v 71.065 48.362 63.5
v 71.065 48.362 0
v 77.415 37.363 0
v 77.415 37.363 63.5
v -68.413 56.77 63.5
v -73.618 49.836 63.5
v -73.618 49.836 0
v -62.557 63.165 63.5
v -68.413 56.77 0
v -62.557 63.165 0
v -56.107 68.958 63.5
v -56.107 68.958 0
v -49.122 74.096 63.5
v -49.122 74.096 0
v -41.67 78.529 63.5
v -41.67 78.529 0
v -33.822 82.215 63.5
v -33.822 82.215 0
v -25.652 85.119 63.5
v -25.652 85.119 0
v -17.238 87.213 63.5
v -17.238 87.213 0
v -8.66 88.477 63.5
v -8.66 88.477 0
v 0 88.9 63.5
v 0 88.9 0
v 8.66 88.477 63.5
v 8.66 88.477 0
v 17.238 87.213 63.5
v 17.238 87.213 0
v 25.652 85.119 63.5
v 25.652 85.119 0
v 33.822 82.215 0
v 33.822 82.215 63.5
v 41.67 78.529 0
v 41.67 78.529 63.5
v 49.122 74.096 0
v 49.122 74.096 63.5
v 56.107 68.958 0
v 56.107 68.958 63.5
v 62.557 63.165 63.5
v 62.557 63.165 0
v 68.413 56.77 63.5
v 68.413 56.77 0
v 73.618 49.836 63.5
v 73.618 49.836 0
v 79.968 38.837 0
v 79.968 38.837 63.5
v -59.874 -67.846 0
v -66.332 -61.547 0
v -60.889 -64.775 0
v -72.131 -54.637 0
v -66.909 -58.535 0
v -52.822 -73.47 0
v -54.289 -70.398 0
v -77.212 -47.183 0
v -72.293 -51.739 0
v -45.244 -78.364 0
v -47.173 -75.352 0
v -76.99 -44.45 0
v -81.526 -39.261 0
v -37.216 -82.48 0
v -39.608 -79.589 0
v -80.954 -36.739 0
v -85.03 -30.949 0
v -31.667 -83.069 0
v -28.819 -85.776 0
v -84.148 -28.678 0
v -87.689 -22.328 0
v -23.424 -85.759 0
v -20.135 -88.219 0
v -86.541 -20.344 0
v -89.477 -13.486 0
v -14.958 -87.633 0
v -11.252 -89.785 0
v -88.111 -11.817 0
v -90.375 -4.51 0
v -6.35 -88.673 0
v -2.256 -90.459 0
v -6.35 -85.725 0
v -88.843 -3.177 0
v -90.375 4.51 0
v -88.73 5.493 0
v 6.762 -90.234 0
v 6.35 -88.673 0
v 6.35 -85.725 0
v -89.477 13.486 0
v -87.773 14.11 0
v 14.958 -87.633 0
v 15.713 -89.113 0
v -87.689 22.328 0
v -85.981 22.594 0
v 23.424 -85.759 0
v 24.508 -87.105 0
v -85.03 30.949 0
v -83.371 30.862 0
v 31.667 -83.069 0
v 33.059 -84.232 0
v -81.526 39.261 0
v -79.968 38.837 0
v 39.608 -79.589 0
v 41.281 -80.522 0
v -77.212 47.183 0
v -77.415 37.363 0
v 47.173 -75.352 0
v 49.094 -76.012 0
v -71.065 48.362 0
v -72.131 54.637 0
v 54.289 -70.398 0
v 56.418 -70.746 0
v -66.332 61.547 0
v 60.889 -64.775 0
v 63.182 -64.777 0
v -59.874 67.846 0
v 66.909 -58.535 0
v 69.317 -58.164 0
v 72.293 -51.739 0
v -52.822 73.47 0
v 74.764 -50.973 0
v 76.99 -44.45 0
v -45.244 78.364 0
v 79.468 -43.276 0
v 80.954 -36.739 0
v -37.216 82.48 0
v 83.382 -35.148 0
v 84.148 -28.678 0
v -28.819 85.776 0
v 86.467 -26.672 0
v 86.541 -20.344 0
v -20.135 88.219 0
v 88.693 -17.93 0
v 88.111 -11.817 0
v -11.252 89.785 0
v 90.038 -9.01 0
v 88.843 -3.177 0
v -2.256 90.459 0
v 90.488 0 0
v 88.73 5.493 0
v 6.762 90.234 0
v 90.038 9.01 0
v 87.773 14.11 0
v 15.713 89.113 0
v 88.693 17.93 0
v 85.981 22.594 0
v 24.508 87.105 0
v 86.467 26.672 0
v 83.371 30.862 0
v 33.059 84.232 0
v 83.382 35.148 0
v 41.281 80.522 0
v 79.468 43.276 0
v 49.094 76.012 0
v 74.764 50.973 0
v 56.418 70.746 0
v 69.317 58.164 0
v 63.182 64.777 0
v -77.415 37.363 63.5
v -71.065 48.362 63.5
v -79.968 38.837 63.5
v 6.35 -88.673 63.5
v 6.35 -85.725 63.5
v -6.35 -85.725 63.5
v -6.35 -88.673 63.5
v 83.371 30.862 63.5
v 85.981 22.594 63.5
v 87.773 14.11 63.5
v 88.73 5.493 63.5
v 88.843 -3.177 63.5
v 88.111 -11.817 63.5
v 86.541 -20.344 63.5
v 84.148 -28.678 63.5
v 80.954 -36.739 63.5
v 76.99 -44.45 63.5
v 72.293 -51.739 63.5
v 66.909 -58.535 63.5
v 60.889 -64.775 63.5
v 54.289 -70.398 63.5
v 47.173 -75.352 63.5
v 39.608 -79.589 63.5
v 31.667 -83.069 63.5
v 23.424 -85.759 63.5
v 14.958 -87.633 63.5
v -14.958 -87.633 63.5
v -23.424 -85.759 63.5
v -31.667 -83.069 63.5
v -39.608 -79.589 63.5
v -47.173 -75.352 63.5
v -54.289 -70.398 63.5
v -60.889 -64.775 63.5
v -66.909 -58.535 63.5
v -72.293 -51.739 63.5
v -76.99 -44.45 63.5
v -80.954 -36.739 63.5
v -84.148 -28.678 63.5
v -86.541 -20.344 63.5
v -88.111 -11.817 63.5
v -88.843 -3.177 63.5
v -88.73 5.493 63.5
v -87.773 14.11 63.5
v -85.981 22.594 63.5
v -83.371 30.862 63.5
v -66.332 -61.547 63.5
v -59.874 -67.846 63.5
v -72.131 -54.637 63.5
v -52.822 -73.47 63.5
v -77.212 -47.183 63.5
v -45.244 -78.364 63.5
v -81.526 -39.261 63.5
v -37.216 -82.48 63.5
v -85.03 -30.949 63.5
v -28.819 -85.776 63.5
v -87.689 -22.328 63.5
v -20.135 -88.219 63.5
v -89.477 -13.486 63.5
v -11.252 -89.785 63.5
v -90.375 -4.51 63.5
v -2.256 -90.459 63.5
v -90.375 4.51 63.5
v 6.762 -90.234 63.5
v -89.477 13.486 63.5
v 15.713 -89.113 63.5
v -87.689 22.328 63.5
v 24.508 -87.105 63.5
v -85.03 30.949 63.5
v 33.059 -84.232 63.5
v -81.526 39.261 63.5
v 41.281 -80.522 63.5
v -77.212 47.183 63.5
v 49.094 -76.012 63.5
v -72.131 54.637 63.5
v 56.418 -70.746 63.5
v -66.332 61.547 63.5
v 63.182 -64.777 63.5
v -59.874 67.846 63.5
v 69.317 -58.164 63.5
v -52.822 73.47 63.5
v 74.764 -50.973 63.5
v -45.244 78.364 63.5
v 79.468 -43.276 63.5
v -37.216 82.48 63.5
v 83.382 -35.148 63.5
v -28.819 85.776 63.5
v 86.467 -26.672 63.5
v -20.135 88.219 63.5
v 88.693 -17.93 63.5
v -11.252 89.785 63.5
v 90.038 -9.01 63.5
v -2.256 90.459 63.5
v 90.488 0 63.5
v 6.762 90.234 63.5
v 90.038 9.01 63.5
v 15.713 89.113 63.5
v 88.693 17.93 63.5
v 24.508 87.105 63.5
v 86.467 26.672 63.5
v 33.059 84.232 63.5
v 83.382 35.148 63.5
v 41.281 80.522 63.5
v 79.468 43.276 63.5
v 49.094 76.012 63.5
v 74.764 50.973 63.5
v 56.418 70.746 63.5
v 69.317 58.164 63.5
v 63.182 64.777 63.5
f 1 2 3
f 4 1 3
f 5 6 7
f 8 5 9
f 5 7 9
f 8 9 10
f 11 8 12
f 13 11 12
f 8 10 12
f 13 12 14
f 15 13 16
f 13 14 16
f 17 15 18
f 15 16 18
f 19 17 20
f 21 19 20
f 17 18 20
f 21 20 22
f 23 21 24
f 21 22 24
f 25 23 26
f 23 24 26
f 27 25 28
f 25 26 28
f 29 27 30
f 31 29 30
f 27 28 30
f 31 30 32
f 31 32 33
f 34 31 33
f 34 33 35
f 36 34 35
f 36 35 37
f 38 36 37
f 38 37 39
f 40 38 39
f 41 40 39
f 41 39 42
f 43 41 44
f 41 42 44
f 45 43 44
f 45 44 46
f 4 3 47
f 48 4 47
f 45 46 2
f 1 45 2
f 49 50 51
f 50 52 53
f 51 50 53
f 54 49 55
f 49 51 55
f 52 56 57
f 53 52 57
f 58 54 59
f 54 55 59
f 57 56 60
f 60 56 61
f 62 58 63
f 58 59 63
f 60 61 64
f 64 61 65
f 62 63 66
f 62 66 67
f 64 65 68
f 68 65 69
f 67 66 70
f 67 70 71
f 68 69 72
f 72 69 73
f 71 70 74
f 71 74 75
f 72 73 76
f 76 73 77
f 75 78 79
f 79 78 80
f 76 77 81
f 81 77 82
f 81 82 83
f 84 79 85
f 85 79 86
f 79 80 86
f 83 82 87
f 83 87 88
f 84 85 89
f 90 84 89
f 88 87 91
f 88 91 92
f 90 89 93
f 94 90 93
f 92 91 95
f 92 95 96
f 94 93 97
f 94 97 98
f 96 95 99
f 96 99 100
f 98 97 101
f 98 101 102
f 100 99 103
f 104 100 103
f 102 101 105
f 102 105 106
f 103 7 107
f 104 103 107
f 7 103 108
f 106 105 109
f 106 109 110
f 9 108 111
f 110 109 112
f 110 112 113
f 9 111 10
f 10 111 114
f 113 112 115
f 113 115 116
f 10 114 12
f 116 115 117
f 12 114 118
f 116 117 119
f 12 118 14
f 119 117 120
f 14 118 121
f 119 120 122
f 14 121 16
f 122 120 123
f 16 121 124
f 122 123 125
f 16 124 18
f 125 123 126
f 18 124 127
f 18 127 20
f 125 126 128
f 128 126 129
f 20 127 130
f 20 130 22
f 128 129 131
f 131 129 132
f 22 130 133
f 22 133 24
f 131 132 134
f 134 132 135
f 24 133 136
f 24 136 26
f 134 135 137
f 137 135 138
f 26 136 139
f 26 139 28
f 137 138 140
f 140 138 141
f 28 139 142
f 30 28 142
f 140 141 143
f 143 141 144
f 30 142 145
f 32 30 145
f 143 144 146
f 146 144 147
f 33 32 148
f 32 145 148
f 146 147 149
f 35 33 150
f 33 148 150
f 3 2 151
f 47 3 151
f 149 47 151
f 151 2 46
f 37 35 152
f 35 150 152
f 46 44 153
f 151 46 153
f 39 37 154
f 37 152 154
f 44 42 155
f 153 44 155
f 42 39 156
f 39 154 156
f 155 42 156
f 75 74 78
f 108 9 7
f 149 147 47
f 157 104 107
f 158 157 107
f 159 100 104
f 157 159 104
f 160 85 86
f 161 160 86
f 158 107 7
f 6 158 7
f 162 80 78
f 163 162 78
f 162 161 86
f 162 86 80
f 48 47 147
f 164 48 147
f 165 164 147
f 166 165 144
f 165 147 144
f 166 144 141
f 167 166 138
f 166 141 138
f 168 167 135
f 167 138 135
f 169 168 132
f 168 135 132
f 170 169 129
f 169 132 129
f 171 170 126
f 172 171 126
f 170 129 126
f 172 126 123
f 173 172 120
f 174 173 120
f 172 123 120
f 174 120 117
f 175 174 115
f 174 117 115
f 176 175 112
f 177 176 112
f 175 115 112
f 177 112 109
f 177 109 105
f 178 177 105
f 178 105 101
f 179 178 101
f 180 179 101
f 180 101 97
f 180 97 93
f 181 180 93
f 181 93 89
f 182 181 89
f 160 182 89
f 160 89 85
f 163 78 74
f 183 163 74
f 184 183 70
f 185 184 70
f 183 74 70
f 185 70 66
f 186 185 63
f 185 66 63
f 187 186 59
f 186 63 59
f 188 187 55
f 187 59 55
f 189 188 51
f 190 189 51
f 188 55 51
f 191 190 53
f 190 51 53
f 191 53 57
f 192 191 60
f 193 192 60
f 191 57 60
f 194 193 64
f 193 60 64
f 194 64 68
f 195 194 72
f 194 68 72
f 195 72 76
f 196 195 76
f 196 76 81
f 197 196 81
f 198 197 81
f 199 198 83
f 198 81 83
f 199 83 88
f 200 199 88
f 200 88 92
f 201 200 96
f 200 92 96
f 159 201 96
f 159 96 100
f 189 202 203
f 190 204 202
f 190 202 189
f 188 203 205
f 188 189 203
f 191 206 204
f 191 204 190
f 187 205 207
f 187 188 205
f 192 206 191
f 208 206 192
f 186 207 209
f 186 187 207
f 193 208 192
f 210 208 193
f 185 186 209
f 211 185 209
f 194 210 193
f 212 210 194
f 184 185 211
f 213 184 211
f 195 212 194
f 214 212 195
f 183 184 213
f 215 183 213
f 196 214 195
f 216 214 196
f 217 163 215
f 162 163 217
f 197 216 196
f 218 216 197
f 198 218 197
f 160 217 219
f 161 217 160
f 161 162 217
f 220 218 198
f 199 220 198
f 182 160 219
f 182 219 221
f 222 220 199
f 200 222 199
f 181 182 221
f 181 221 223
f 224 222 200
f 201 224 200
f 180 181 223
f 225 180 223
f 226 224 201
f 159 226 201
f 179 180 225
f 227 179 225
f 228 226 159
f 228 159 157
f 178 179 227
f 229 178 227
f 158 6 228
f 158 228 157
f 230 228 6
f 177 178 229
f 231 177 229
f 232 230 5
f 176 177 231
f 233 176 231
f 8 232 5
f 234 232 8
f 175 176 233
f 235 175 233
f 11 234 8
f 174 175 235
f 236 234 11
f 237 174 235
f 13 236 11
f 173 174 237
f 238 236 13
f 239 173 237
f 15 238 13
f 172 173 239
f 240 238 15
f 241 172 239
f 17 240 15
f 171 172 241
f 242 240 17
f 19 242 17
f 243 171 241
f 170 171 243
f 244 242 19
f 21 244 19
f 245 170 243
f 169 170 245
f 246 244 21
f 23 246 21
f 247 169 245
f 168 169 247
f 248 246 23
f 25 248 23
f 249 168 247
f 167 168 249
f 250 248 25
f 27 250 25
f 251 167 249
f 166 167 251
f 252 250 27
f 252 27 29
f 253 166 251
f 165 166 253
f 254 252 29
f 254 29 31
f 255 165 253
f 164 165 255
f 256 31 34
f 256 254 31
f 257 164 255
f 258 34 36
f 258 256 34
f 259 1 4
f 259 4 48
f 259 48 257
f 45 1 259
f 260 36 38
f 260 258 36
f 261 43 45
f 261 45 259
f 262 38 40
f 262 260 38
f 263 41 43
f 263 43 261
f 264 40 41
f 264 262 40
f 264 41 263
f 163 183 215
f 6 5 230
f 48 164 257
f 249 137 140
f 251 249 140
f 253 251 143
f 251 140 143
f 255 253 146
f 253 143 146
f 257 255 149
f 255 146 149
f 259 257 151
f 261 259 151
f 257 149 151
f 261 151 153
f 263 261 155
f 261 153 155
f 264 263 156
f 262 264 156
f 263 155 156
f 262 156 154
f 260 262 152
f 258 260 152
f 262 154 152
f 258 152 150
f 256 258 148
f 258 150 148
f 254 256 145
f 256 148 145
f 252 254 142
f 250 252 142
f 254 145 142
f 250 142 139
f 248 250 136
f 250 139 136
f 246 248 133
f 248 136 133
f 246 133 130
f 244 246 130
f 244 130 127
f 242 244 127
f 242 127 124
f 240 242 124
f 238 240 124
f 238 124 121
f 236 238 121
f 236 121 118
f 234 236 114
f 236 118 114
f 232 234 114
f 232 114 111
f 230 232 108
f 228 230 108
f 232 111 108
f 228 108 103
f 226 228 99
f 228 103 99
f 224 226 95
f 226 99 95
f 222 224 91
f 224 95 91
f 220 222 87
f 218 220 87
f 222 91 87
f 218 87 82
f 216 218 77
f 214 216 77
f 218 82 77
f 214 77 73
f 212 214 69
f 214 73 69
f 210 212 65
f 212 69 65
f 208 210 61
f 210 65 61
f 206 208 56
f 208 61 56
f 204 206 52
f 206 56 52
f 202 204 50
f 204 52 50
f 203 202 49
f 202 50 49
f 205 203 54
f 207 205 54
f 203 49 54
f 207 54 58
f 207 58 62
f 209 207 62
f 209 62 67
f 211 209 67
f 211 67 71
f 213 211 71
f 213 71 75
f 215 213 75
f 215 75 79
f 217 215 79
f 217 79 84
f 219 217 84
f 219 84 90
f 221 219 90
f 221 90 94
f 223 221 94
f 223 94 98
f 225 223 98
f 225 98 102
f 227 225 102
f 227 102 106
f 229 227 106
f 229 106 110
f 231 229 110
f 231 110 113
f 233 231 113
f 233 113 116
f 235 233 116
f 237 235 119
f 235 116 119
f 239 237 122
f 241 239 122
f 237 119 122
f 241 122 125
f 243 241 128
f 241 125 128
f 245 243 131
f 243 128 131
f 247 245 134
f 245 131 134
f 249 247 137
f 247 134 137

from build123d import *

# Parameters (mm, degrees)
F0_R     = 90.4875
F1_DEPTH = 63.5


with BuildPart() as f1:
    # F0 (on Top) → F1 (new body)
    with BuildSketch(Plane.XY):
        Circle(F0_R)
        with BuildLine():
            ThreePointArc((-6.35, -88.672924), (-76.989658, -44.45), (-79.968005, 38.837201))
            Line((-79.968005, 38.837201), (-77.415028, 37.363239))
            Line((-77.415028, 37.363239), (-74.240028, 42.8625))
            Line((-74.240028, 42.8625), (-71.065028, 48.361761))
            Line((-71.065028, 48.361761), (-73.618005, 49.835723))
            ThreePointArc((-73.618005, 49.835723), (0, 88.9), (73.618005, 49.835723))
            Line((73.618005, 49.835723), (71.065028, 48.361761))
            Line((71.065028, 48.361761), (74.240028, 42.8625))
            Line((74.240028, 42.8625), (77.415028, 37.363239))
            Line((77.415028, 37.363239), (79.968005, 38.837201))
            ThreePointArc((79.968005, 38.837201), (76.989658, -44.45), (6.35, -88.672924))
            Line((6.35, -88.672924), (6.35, -85.725))
            Line((6.35, -85.725), (0, -85.725))
            Line((0, -85.725), (-6.35, -85.725))
            Line((-6.35, -85.725), (-6.35, -88.672924))
        make_face(mode=Mode.SUBTRACT)
    extrude(amount=F1_DEPTH)


solid = f1.part
